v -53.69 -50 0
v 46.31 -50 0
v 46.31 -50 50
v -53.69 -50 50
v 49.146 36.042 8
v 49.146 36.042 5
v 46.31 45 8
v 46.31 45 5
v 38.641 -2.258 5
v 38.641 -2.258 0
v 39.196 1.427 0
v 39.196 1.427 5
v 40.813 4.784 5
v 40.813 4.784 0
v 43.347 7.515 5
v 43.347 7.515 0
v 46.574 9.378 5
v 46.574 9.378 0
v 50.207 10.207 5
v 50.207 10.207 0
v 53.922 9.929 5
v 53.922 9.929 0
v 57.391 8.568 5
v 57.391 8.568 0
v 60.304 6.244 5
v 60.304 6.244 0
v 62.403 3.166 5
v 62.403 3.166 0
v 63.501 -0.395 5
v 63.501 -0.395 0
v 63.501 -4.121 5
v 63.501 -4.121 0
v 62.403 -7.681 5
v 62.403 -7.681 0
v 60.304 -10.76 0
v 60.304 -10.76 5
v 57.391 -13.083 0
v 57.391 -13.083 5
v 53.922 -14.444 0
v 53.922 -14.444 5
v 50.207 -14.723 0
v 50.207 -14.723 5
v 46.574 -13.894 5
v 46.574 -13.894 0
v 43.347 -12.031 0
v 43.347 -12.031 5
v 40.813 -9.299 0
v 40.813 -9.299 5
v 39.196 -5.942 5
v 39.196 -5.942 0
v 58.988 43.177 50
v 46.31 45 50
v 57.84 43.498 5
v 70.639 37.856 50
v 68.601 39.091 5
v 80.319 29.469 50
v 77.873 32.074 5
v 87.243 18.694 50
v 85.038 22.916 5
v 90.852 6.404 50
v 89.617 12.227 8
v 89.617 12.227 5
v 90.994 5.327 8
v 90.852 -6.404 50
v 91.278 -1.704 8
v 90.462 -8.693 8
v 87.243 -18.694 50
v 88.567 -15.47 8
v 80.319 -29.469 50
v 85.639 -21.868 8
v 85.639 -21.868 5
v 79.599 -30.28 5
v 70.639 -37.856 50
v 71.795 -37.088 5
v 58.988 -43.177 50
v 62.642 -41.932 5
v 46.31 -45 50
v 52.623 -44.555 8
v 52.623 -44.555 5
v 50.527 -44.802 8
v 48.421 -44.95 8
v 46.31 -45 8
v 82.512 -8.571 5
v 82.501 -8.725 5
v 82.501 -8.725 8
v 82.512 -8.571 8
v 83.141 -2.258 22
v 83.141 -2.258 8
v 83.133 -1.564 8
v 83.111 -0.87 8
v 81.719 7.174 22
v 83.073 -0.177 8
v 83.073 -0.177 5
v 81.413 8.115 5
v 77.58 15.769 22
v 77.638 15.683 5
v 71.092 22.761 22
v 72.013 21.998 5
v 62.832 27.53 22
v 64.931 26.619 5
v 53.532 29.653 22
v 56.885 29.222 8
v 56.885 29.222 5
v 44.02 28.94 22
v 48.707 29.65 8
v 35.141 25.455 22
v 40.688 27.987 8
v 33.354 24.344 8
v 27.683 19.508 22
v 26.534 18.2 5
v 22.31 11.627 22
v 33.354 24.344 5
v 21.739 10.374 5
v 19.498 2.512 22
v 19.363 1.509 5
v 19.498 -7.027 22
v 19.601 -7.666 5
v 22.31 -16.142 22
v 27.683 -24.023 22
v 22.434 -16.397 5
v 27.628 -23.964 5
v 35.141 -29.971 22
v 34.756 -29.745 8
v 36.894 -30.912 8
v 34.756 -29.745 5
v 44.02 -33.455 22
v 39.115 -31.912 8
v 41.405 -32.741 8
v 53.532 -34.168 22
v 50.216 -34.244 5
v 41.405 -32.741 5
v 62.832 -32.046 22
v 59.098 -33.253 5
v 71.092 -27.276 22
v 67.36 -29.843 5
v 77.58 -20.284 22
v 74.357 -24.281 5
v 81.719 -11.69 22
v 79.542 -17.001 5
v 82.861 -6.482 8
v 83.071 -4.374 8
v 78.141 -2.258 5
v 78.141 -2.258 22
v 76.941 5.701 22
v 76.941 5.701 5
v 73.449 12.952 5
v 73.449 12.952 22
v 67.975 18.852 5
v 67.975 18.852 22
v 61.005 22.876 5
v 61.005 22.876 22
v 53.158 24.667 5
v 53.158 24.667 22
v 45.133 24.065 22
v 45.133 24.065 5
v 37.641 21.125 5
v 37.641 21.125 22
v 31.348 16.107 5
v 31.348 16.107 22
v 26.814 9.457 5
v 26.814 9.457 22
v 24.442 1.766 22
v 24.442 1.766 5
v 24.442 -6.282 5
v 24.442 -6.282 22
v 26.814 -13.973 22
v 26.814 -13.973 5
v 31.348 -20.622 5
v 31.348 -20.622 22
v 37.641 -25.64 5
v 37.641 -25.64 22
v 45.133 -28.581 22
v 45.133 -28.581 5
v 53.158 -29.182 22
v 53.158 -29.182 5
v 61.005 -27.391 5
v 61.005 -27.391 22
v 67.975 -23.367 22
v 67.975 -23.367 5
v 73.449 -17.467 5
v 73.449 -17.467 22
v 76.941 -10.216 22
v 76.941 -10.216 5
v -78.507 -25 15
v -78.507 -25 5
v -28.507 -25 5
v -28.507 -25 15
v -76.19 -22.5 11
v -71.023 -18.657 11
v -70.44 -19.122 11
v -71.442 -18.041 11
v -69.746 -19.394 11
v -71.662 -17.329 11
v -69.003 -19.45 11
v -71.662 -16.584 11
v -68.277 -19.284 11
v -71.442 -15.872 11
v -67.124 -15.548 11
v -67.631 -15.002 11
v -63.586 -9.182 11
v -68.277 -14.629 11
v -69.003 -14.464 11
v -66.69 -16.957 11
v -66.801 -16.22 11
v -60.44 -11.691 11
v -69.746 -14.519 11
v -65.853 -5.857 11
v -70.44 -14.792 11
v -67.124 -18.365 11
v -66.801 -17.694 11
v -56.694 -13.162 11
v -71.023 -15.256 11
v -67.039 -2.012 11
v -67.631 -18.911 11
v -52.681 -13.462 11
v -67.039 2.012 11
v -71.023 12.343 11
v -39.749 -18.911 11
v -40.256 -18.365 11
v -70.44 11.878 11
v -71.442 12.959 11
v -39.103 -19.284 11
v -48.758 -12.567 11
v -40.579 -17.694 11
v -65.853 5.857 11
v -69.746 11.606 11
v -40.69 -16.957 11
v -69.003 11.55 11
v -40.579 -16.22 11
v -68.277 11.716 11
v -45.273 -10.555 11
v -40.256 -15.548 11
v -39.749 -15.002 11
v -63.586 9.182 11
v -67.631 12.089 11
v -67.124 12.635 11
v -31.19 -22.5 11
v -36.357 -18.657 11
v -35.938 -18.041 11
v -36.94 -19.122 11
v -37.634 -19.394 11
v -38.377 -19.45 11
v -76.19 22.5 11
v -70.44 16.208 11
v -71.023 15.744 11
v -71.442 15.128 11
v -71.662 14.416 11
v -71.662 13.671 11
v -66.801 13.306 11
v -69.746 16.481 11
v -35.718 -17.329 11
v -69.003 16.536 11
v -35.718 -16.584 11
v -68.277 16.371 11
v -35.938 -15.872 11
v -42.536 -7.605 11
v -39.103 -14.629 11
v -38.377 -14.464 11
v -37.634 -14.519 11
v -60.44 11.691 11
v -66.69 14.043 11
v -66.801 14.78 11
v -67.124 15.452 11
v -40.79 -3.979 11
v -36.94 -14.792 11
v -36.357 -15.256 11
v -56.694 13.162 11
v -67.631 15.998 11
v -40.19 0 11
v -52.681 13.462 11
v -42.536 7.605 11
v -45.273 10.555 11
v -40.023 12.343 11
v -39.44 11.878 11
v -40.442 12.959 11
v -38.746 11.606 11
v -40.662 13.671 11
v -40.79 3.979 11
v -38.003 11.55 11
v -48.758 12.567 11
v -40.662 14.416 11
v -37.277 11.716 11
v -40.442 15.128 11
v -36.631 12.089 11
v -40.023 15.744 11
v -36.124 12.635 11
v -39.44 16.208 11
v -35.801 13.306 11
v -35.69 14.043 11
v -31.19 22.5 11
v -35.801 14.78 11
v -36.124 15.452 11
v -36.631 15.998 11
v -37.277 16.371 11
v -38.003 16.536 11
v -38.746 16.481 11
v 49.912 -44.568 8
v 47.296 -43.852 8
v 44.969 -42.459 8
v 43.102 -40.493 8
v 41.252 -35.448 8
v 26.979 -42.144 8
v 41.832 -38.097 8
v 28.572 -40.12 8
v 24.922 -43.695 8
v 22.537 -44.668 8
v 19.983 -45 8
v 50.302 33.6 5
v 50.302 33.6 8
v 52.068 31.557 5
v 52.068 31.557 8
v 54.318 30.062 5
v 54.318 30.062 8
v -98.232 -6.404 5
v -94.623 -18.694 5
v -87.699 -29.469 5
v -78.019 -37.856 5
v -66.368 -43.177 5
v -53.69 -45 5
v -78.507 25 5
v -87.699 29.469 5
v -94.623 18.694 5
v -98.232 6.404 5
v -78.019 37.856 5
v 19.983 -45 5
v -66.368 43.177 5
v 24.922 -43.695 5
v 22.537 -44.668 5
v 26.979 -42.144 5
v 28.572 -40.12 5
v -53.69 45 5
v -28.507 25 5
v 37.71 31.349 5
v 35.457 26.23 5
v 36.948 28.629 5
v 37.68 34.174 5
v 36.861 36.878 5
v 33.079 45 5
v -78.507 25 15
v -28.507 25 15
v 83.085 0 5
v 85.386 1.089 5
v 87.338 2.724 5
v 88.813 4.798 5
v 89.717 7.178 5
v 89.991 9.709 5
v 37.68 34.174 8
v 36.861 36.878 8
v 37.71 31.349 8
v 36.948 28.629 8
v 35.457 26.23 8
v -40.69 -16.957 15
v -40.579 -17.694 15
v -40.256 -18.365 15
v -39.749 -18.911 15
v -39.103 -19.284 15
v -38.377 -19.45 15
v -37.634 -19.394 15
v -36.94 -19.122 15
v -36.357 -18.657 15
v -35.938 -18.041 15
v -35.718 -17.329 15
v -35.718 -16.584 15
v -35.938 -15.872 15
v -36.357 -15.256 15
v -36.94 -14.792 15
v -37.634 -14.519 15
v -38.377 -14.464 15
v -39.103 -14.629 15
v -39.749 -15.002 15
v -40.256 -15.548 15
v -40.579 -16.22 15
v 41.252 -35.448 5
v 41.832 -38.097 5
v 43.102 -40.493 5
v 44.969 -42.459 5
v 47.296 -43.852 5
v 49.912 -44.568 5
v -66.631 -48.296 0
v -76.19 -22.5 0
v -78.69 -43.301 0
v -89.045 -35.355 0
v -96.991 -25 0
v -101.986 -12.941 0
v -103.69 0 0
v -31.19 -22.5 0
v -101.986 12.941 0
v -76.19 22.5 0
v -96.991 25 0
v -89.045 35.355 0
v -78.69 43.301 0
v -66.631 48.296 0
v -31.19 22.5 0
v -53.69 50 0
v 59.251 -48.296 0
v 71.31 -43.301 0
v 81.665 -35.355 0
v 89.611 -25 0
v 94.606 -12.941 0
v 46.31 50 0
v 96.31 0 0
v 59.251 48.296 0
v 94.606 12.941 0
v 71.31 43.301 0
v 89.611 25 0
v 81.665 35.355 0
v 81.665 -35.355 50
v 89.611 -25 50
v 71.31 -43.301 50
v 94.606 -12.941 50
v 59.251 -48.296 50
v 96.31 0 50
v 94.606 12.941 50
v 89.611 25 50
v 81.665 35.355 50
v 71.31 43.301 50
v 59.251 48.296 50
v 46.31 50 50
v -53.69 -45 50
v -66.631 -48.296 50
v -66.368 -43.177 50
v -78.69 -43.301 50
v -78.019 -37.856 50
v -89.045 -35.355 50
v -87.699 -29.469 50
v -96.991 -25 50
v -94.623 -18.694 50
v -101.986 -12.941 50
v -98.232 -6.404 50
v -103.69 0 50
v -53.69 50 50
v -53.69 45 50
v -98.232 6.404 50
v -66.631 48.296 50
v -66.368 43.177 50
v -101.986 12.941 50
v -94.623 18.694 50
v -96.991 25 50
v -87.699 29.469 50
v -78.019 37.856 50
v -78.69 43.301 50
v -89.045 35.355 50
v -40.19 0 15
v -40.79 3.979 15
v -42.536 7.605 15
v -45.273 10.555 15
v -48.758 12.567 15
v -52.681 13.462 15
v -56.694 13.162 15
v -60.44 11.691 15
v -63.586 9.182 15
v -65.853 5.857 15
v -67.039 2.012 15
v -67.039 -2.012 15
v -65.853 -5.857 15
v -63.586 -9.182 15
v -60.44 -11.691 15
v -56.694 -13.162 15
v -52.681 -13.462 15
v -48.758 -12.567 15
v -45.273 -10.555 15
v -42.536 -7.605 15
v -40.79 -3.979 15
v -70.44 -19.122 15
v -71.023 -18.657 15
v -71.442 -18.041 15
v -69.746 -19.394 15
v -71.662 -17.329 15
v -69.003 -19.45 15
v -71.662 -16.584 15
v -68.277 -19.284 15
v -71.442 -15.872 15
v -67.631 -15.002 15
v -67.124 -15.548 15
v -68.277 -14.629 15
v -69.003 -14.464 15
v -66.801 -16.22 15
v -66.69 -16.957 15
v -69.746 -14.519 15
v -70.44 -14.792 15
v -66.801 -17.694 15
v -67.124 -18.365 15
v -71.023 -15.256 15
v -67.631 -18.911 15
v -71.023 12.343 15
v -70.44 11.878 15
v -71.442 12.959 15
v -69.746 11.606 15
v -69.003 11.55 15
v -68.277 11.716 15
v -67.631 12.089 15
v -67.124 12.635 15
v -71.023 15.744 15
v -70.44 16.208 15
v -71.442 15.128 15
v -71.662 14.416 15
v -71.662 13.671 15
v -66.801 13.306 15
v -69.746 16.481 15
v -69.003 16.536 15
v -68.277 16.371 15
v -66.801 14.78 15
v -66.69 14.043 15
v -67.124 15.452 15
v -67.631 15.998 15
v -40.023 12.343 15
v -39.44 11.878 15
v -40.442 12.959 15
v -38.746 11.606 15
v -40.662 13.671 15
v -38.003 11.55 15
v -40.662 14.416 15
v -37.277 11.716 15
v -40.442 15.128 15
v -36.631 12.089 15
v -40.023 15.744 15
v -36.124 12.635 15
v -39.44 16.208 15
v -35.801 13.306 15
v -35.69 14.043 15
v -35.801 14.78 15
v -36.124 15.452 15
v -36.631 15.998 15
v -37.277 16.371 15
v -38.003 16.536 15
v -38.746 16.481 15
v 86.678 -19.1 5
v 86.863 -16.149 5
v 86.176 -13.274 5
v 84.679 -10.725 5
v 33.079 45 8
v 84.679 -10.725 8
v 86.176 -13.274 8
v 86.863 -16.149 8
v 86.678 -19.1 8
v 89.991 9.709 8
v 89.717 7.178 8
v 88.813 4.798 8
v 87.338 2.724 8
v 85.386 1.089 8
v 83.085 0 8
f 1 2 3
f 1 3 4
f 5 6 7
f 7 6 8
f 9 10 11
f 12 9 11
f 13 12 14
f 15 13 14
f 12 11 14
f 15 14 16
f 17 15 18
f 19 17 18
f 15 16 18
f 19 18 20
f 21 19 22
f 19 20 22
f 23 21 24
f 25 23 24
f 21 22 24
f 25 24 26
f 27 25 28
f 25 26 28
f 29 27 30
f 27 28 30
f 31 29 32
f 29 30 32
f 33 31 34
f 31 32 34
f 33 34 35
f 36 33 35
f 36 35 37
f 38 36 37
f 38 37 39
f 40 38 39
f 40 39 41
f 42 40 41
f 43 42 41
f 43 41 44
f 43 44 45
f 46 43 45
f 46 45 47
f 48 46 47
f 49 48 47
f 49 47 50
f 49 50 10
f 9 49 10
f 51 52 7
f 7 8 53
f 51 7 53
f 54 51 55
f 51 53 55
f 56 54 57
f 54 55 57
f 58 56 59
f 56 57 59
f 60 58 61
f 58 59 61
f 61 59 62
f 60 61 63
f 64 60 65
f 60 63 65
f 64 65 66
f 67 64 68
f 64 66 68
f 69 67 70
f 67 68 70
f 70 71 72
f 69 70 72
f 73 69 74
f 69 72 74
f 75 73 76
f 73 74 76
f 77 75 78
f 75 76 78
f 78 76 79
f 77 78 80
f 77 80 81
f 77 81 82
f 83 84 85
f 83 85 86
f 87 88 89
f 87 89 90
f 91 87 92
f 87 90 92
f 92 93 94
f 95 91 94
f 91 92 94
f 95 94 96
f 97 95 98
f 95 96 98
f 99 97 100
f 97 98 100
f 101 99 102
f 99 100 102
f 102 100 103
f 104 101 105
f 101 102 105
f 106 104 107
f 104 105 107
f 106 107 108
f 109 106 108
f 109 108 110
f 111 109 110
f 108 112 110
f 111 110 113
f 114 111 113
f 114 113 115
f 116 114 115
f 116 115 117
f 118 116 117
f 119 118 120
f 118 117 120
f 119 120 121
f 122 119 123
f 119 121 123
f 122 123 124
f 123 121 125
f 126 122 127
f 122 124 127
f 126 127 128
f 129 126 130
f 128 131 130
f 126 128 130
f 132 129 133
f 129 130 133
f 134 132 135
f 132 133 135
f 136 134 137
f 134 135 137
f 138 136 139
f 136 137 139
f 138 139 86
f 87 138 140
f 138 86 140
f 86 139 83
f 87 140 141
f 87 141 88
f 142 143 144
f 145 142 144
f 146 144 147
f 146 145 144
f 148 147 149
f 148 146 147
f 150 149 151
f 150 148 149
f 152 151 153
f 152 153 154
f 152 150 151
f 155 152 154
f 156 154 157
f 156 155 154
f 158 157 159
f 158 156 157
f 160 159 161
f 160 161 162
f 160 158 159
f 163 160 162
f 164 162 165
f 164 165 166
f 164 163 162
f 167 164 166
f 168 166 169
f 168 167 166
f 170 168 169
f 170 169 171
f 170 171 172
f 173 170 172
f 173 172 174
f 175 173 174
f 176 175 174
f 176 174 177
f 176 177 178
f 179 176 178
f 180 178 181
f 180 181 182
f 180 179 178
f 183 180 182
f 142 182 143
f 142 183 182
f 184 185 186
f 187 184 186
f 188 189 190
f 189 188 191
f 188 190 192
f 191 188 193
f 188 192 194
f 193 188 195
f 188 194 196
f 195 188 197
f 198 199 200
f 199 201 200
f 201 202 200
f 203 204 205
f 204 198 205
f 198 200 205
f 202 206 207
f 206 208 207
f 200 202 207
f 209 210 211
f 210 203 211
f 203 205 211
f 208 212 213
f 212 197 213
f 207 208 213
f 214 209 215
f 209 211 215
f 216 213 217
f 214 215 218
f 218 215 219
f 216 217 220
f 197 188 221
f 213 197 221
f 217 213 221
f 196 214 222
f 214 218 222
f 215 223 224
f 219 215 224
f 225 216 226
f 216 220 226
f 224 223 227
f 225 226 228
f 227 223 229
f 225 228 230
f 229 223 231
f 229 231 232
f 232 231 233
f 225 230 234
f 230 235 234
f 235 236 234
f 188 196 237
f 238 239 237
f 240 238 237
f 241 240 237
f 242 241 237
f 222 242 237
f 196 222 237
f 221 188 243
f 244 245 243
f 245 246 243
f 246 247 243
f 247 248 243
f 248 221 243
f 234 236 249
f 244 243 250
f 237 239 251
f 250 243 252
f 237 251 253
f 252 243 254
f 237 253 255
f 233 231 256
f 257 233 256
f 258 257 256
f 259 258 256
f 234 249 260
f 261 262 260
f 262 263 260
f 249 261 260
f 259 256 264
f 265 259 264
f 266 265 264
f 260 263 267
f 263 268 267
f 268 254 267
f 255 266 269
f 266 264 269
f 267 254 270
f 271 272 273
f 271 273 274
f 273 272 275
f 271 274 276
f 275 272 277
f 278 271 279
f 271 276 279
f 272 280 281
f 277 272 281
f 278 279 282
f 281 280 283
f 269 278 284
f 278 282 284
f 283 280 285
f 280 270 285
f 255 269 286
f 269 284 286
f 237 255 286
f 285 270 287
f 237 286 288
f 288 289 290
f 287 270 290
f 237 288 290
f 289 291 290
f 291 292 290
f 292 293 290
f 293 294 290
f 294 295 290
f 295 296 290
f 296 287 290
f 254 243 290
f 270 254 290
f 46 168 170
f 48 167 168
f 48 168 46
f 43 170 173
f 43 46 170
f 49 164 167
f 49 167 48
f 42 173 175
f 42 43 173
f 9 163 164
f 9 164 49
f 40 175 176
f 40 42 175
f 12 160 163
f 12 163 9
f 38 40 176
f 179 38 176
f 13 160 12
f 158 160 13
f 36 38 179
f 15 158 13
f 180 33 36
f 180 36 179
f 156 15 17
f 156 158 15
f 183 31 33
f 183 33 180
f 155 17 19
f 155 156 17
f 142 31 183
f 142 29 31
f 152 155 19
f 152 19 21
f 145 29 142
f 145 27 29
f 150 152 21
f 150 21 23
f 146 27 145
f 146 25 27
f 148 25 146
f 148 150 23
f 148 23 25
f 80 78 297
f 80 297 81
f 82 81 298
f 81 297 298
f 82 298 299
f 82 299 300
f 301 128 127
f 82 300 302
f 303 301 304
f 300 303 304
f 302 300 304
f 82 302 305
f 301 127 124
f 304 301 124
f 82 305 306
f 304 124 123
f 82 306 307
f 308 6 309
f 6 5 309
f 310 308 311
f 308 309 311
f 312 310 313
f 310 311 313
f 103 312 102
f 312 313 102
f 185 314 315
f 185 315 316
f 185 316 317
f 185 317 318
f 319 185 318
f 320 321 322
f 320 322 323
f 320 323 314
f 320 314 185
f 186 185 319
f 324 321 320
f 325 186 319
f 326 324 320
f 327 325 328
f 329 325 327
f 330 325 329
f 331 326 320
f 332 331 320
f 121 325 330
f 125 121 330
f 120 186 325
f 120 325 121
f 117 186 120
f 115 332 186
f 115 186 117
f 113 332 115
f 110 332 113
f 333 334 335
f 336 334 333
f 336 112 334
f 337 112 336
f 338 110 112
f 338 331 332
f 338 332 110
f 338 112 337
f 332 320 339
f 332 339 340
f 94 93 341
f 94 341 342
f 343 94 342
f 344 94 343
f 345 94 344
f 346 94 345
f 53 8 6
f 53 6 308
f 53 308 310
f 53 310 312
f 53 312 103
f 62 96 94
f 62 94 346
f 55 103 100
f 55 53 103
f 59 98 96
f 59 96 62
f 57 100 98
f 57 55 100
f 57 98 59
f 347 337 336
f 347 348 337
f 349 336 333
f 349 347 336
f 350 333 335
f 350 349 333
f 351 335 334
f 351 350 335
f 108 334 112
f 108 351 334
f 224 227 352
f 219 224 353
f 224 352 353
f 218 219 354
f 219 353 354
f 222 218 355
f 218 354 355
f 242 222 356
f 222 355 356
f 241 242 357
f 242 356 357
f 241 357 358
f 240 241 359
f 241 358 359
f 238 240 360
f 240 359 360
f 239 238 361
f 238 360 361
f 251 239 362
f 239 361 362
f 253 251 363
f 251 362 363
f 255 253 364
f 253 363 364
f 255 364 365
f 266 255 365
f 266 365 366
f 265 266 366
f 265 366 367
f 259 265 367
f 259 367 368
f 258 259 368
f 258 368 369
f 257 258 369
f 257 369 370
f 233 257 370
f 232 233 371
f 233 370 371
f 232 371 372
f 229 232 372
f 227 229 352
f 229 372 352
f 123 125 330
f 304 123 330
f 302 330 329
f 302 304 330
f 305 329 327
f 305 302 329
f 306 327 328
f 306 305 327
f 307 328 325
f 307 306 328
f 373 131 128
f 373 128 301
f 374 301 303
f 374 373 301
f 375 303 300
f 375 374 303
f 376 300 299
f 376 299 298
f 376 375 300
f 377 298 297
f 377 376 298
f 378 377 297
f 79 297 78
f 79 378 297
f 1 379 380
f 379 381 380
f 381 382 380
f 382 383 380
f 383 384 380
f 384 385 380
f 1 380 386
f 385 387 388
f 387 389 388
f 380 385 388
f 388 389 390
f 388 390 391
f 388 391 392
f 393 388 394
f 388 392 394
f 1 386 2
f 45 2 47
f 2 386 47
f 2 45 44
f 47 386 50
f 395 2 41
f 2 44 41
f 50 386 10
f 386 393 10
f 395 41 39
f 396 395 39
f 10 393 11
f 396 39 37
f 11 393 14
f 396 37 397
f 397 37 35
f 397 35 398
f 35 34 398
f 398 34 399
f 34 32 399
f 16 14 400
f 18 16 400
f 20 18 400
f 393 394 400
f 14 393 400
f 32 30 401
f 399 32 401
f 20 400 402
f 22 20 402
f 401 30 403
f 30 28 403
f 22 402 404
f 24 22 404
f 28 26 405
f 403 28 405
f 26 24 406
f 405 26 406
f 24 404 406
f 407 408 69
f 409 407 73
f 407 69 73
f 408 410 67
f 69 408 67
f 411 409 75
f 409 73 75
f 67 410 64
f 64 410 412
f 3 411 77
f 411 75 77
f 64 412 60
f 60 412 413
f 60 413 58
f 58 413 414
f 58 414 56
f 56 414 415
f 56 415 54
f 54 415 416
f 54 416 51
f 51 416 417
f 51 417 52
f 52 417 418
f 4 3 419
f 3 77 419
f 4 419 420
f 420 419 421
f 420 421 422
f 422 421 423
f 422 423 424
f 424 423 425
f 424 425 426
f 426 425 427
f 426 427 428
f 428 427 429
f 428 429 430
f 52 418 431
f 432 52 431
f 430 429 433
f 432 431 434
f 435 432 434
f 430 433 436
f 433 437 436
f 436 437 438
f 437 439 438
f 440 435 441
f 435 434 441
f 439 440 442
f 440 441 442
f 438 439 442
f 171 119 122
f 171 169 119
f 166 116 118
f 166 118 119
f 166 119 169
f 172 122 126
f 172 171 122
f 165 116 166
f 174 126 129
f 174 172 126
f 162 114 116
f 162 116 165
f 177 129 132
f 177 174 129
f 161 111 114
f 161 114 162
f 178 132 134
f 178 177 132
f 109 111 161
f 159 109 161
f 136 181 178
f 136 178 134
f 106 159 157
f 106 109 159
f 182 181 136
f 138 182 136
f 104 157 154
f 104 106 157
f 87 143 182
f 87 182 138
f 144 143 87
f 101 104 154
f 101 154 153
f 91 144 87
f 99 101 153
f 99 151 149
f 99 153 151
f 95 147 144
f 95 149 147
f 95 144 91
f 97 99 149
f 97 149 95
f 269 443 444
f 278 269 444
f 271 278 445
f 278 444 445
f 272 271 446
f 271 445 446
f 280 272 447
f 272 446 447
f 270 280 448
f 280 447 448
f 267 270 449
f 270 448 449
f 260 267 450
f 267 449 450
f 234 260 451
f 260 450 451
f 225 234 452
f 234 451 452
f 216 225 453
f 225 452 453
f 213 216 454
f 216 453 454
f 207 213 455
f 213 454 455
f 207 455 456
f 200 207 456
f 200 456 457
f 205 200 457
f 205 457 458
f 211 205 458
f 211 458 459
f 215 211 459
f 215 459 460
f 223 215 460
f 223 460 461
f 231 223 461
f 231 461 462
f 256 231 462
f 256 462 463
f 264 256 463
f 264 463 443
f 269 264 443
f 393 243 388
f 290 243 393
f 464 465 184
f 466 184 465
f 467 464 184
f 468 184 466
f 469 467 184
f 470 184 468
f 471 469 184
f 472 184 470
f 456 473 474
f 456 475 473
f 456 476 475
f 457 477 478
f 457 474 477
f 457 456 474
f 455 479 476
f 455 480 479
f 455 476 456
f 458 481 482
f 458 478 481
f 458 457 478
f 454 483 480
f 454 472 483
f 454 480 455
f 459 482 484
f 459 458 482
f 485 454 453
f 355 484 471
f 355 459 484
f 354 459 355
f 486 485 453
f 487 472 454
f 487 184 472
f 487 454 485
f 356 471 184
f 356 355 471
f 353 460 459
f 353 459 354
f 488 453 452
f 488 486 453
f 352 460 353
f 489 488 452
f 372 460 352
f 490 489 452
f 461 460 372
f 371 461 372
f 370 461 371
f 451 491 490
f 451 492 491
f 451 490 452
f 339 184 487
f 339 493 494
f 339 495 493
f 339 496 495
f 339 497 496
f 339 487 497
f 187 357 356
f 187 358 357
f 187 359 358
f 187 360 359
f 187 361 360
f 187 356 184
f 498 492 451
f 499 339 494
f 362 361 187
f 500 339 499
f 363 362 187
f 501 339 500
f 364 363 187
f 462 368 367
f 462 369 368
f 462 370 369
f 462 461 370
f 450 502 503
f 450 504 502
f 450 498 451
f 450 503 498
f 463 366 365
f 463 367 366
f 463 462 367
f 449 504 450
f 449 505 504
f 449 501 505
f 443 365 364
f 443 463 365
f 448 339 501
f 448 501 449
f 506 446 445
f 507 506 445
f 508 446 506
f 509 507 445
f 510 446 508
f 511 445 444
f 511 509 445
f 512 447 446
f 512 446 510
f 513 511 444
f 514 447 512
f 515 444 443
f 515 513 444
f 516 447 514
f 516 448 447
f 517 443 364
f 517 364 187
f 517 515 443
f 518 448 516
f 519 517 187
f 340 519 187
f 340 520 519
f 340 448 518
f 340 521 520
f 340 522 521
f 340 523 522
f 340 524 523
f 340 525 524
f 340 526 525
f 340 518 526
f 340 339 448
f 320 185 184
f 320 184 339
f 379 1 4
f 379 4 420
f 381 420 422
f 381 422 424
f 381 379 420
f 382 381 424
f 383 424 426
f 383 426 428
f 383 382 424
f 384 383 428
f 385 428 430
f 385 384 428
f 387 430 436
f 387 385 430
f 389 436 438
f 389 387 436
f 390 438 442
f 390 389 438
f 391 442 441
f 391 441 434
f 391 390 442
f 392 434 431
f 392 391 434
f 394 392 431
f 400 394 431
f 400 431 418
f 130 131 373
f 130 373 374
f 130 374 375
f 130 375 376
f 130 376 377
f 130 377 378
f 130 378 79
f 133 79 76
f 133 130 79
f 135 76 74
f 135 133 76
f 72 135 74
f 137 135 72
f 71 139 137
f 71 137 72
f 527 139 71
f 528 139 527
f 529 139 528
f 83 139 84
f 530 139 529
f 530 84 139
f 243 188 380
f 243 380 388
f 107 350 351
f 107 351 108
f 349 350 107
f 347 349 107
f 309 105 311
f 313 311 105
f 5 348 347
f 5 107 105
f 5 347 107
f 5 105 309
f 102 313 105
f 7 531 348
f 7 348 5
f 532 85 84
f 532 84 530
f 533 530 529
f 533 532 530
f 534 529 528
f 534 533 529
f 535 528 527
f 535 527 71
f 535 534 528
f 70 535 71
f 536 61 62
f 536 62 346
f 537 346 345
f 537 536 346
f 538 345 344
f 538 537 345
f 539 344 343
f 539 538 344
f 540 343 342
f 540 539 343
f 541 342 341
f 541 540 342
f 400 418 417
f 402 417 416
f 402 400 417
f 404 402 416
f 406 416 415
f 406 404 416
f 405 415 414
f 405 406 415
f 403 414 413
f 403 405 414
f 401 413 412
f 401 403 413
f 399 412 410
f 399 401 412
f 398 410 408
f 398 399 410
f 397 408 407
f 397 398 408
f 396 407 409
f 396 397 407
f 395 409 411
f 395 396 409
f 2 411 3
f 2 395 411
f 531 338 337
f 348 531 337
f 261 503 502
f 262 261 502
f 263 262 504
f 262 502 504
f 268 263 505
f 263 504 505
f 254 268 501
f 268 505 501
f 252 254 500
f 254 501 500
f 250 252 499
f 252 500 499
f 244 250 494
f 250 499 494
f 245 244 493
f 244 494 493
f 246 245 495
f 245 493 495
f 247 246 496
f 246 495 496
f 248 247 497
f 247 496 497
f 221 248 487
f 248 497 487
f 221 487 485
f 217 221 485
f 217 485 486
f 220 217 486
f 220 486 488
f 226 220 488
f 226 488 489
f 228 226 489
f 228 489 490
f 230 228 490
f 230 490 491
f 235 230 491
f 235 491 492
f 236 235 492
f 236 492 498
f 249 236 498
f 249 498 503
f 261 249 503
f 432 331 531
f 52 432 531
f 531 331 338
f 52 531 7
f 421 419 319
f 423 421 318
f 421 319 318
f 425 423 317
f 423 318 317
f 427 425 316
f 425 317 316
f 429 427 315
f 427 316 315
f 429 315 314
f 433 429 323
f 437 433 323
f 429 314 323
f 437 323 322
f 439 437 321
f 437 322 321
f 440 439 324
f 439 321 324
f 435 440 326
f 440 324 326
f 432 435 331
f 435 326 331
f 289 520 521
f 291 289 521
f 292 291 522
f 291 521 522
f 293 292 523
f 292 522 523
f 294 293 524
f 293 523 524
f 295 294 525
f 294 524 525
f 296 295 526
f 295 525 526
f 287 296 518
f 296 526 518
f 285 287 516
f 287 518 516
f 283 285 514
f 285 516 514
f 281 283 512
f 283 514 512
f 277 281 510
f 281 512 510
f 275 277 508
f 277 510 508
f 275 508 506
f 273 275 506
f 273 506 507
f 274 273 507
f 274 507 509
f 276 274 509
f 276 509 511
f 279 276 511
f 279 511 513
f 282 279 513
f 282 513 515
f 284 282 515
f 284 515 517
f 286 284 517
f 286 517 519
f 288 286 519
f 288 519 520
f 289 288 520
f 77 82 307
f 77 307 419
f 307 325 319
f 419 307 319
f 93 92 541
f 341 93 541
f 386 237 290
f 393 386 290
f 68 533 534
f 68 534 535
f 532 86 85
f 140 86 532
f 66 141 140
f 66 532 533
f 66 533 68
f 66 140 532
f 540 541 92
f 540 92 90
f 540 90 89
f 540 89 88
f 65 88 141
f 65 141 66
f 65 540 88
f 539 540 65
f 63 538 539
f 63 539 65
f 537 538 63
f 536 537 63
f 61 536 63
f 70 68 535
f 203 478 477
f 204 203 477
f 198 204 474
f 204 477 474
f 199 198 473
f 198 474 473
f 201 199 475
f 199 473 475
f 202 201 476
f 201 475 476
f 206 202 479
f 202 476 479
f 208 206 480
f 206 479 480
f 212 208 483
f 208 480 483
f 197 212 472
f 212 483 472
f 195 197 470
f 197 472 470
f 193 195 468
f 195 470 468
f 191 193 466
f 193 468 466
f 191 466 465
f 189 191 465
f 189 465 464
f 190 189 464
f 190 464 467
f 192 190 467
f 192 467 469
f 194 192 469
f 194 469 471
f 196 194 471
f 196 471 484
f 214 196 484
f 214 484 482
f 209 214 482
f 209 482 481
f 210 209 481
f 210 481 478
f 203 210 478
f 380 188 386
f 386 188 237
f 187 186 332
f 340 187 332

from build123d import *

# Parameters (mm, degrees)
EXTRUDE_THIN1_DEPTH  = 50
BOSS_EXTRUDE1_DEPTH  = 5
SKETCH5_R            = 32
SKETCH5_R_2          = 27
EXTRUDE_THIN4_DEPTH  = 17
SKETCH2_R            = 12.5
CUT_EXTRUDE2_DEPTH   = 126.505472998
BOSS_EXTRUDE4_DEPTH  = 3
FILLET1_R            = 10
FILLET2_R            = 10
BOSS_EXTRUDE5_DEPTH  = 3
FILLET3_R            = 10
FILLET4_R            = 10
BOSS_EXTRUDE11_DEPTH = 3
FILLET6_R            = 10
FILLET7_R            = 10
SKETCH14_W           = 50
SKETCH14_H           = 50
BOSS_EXTRUDE12_DEPTH = 10
CUT_EXTRUDE5_START   = -4
SKETCH16_W           = 45
SKETCH16_H           = 45
SKETCH16_R           = 13.5
SKETCH16_R_2         = 2.5
CUT_EXTRUDE5_DEPTH   = 25
SKETCH16_2_R         = 2.5
SKETCH16_2_R_2       = 13.5
CUT_EXTRUDE6_DEPTH   = 121.318842051


with BuildPart() as part:
    # Sketch1 → Extrude-Thin1 (new body)
    with BuildSketch(Plane.XY):
        with BuildLine():
            Line((-53.6900369, 50), (46.3099631, 50))
            ThreePointArc((46.3099631, 50), (96.3099631, 0), (46.3099631, -50))
            Line((46.3099631, -50), (-53.6900369, -50))
            ThreePointArc((-53.6900369, -50), (-103.6900369, 0), (-53.6900369, 50))
        make_face()
        with BuildLine():
            Line((-53.6900369, 45), (46.3099631, 45))
            ThreePointArc((46.3099631, 45), (91.3099631, 0), (46.3099631, -45))
            Line((46.3099631, -45), (-53.6900369, -45))
            ThreePointArc((-53.6900369, -45), (-98.6900369, 0), (-53.6900369, 45))
        make_face(mode=Mode.SUBTRACT)
    extrude(amount=EXTRUDE_THIN1_DEPTH)

    # Sketch1<3> → Boss-Extrude1 (add)
    with BuildSketch(Plane.XY):
        with BuildLine():
            Line((-53.6900369, -45), (46.3099631, -45))
            ThreePointArc((46.3099631, -45), (91.3099631, 0), (46.3099631, 45))
            Line((46.3099631, 45), (-53.6900369, 45))
            ThreePointArc((-53.6900369, 45), (-98.6900369, 0), (-53.6900369, -45))
        make_face()
    extrude(amount=BOSS_EXTRUDE1_DEPTH)

    # Sketch5 → Extrude-Thin4 (add)
    with BuildSketch(Plane.XY.offset(5)):
        with Locations((51.14065821, -2.257734505)):
            Circle(SKETCH5_R)
        with Locations((51.14065821, -2.257734505)):
            Circle(SKETCH5_R_2, mode=Mode.SUBTRACT)
    extrude(amount=EXTRUDE_THIN4_DEPTH)

    # Sketch2 → Cut-Extrude2 (cut, through all)
    with BuildSketch(Plane(origin=(0, 0, 0), x_dir=(-1, 0, 0), z_dir=(0, 0, -1))):
        with Locations((-51.14065821, -2.257734505)):
            Circle(SKETCH2_R)
    extrude(amount=-CUT_EXTRUDE2_DEPTH, mode=Mode.SUBTRACT)

    # Sketch10 → Boss-Extrude4 (add)
    with BuildSketch(Plane.XY.offset(5)):
        Polygon((51.14065821, 29.742265495), (46.3099631, 45), (33.078782173, 45), (40.95774875, 28.078849927), (41.321043385, 28.19838417), align=None)
    extrude(amount=BOSS_EXTRUDE4_DEPTH)

    # Fillet1
    fillet1_edges = [part.edges().sort_by_distance(p)[0] for p in [
        (40.95774875, 28.078849927, 6.5),
    ]]
    fillet(fillet1_edges, radius=FILLET1_R)

    # Fillet2
    fillet2_edges = [part.edges().sort_by_distance(p)[0] for p in [
        (51.14065821, 29.742265495, 6.5),
    ]]
    fillet(fillet2_edges, radius=FILLET2_R)

    # Sketch11 → Boss-Extrude5 (add)
    with BuildSketch(Plane.XY.offset(5)):
        Polygon((34.756480548, -29.745162946), (25.663670683, -45), (38.486673363, -45), (41.405025332, -32.740802796), align=None)
    extrude(amount=BOSS_EXTRUDE5_DEPTH)

    # Fillet3
    # the kernel refuses this fillet: 10 mm, written as the material it adds along each edge
    with BuildSketch(Plane(origin=(38.486673363, -45, 5), x_dir=(0.9995047638701084, 0.03146787252037754, 0), z_dir=(0, 0, 1))) as fillet3_piece_1:
        with BuildLine():
            CenterArc((13.052927583, 9.940340464), FILLET3_R, 167.167880579, 109.093840461)
            Line((3.302677551, 12.161291679), (2.327652547, 12.3833868))
            ThreePointArc((2.327652547, 12.3833868), (0.686292727, 6.342726217), (-0.965046048, 0.262080378))
            Line((-0.965046048, 0.262080378), (-0.031467873, -0.999504764))
            ThreePointArc((-0.031467873, -0.999504764), (7.787947488, -1.245687048), (14.252700085, -0.994034046))
            Line((14.252700085, -0.994034046), (14.143629858, 0))
        make_face()
    extrude(amount=3)

    # Fillet4
    fillet4_edges = [part.edges().sort_by_distance(p)[0] for p in [
        (25.663670683, -45, 6.5),
    ]]
    fillet(fillet4_edges, radius=FILLET4_R)

    # Sketch13 → Boss-Extrude11 (add)
    with BuildSketch(Plane.XY.offset(5)):
        Polygon((90.705735304, -8.724739526), (82.501490248, -8.724739526), (83.084727444, 0), (91.667524575, 0), align=None)
    extrude(amount=BOSS_EXTRUDE11_DEPTH)

    # Fillet6
    # the kernel refuses this fillet: 10 mm, written as the material it adds along each edge
    with BuildSketch(Plane(origin=(91.3099631, 0, 8), x_dir=(-0.13715489744354328, 0.9905496121382569, 0), z_dir=(0, 0, -1))) as fillet6_piece_1:
        with BuildLine():
            CenterArc((10.972391795, -9.905496121), FILLET6_R, 82.116754313, 87.758074962)
            Line((1.128131353, -8.147503989), (0.931246144, -8.112344146))
            ThreePointArc((0.931246144, -8.112344146), (0.365955754, -4.101182974), (-0.198109922, -0.027430979))
            Line((-0.198109922, -0.027430979), (-0.027430979, 0.198109922))
            ThreePointArc((-0.027430979, 0.198109922), (6.171970385, 0.625267454), (12.371371749, 0.198109922))
            Line((12.371371749, 0.198109922), (12.34394077, 0))
        make_face()
    extrude(amount=3)

    # Fillet7
    # the kernel refuses this fillet: 10 mm, written as the material it adds along each edge
    with BuildSketch(Plane(origin=(90.456071877, -8.724739526, 8), x_dir=(-1, 0, 0), z_dir=(0, 0, -1))) as fillet7_piece_1:
        with BuildLine():
            CenterArc((13.556604147, -8.283558638), FILLET7_R, 124.06978595, 85.005036852)
            Line((4.816745681, -13.1430724), (4.641948512, -13.240262675))
            ThreePointArc((4.641948512, -13.240262675), (1.706415001, -6.828793582), (-0.196204928, -0.03877662))
            Line((-0.196204928, -0.03877662), (0, 0.2))
            ThreePointArc((0, 0.2), (3.977290815, 0.2), (7.842541179, 0.165671173))
            Line((7.842541179, 0.165671173), (7.95458163, 0))
        make_face()
    extrude(amount=3)

    # Sketch14 → Boss-Extrude12 (add)
    with BuildSketch(Plane.XY.offset(5)):
        with Locations((-53.507483995, 0)):
            Rectangle(SKETCH14_W, SKETCH14_H)
    extrude(amount=BOSS_EXTRUDE12_DEPTH)

    # Sketch16 → Cut-Extrude5 (cut)
    with BuildSketch(Plane.XY.offset(15).offset(CUT_EXTRUDE5_START)):
        with Locations((-53.6900369, 0)):
            Rectangle(SKETCH16_W, SKETCH16_H)
        with Locations((-53.6900369, 0)):
            Circle(SKETCH16_R, mode=Mode.SUBTRACT)
        with Locations((-69.1900369, 14.04338148)):
            Circle(SKETCH16_R_2, mode=Mode.SUBTRACT)
        with Locations((-69.1900369, -16.95661852)):
            Circle(SKETCH16_R_2, mode=Mode.SUBTRACT)
        with Locations((-38.1900369, -16.95661852)):
            Circle(SKETCH16_R_2, mode=Mode.SUBTRACT)
        with Locations((-38.1900369, 14.04338148)):
            Circle(SKETCH16_R_2, mode=Mode.SUBTRACT)
    extrude(amount=-CUT_EXTRUDE5_DEPTH, mode=Mode.SUBTRACT)

    # Sketch16<2> → Cut-Extrude6 (cut, through all)
    with BuildSketch(Plane.XY.offset(15)):
        with Locations((-38.1900369, 14.04338148)):
            Circle(SKETCH16_2_R)
        with Locations((-69.1900369, 14.04338148)):
            Circle(SKETCH16_2_R)
        with Locations((-53.6900369, 0)):
            Circle(SKETCH16_2_R_2)
        with Locations((-69.1900369, -16.95661852)):
            Circle(SKETCH16_2_R)
        with Locations(Location((-38.1900369, -16.95661852, 0), (0, 0, 180))):
            Circle(SKETCH16_2_R)
    extrude(amount=-CUT_EXTRUDE6_DEPTH, mode=Mode.SUBTRACT)


solid = part.part
